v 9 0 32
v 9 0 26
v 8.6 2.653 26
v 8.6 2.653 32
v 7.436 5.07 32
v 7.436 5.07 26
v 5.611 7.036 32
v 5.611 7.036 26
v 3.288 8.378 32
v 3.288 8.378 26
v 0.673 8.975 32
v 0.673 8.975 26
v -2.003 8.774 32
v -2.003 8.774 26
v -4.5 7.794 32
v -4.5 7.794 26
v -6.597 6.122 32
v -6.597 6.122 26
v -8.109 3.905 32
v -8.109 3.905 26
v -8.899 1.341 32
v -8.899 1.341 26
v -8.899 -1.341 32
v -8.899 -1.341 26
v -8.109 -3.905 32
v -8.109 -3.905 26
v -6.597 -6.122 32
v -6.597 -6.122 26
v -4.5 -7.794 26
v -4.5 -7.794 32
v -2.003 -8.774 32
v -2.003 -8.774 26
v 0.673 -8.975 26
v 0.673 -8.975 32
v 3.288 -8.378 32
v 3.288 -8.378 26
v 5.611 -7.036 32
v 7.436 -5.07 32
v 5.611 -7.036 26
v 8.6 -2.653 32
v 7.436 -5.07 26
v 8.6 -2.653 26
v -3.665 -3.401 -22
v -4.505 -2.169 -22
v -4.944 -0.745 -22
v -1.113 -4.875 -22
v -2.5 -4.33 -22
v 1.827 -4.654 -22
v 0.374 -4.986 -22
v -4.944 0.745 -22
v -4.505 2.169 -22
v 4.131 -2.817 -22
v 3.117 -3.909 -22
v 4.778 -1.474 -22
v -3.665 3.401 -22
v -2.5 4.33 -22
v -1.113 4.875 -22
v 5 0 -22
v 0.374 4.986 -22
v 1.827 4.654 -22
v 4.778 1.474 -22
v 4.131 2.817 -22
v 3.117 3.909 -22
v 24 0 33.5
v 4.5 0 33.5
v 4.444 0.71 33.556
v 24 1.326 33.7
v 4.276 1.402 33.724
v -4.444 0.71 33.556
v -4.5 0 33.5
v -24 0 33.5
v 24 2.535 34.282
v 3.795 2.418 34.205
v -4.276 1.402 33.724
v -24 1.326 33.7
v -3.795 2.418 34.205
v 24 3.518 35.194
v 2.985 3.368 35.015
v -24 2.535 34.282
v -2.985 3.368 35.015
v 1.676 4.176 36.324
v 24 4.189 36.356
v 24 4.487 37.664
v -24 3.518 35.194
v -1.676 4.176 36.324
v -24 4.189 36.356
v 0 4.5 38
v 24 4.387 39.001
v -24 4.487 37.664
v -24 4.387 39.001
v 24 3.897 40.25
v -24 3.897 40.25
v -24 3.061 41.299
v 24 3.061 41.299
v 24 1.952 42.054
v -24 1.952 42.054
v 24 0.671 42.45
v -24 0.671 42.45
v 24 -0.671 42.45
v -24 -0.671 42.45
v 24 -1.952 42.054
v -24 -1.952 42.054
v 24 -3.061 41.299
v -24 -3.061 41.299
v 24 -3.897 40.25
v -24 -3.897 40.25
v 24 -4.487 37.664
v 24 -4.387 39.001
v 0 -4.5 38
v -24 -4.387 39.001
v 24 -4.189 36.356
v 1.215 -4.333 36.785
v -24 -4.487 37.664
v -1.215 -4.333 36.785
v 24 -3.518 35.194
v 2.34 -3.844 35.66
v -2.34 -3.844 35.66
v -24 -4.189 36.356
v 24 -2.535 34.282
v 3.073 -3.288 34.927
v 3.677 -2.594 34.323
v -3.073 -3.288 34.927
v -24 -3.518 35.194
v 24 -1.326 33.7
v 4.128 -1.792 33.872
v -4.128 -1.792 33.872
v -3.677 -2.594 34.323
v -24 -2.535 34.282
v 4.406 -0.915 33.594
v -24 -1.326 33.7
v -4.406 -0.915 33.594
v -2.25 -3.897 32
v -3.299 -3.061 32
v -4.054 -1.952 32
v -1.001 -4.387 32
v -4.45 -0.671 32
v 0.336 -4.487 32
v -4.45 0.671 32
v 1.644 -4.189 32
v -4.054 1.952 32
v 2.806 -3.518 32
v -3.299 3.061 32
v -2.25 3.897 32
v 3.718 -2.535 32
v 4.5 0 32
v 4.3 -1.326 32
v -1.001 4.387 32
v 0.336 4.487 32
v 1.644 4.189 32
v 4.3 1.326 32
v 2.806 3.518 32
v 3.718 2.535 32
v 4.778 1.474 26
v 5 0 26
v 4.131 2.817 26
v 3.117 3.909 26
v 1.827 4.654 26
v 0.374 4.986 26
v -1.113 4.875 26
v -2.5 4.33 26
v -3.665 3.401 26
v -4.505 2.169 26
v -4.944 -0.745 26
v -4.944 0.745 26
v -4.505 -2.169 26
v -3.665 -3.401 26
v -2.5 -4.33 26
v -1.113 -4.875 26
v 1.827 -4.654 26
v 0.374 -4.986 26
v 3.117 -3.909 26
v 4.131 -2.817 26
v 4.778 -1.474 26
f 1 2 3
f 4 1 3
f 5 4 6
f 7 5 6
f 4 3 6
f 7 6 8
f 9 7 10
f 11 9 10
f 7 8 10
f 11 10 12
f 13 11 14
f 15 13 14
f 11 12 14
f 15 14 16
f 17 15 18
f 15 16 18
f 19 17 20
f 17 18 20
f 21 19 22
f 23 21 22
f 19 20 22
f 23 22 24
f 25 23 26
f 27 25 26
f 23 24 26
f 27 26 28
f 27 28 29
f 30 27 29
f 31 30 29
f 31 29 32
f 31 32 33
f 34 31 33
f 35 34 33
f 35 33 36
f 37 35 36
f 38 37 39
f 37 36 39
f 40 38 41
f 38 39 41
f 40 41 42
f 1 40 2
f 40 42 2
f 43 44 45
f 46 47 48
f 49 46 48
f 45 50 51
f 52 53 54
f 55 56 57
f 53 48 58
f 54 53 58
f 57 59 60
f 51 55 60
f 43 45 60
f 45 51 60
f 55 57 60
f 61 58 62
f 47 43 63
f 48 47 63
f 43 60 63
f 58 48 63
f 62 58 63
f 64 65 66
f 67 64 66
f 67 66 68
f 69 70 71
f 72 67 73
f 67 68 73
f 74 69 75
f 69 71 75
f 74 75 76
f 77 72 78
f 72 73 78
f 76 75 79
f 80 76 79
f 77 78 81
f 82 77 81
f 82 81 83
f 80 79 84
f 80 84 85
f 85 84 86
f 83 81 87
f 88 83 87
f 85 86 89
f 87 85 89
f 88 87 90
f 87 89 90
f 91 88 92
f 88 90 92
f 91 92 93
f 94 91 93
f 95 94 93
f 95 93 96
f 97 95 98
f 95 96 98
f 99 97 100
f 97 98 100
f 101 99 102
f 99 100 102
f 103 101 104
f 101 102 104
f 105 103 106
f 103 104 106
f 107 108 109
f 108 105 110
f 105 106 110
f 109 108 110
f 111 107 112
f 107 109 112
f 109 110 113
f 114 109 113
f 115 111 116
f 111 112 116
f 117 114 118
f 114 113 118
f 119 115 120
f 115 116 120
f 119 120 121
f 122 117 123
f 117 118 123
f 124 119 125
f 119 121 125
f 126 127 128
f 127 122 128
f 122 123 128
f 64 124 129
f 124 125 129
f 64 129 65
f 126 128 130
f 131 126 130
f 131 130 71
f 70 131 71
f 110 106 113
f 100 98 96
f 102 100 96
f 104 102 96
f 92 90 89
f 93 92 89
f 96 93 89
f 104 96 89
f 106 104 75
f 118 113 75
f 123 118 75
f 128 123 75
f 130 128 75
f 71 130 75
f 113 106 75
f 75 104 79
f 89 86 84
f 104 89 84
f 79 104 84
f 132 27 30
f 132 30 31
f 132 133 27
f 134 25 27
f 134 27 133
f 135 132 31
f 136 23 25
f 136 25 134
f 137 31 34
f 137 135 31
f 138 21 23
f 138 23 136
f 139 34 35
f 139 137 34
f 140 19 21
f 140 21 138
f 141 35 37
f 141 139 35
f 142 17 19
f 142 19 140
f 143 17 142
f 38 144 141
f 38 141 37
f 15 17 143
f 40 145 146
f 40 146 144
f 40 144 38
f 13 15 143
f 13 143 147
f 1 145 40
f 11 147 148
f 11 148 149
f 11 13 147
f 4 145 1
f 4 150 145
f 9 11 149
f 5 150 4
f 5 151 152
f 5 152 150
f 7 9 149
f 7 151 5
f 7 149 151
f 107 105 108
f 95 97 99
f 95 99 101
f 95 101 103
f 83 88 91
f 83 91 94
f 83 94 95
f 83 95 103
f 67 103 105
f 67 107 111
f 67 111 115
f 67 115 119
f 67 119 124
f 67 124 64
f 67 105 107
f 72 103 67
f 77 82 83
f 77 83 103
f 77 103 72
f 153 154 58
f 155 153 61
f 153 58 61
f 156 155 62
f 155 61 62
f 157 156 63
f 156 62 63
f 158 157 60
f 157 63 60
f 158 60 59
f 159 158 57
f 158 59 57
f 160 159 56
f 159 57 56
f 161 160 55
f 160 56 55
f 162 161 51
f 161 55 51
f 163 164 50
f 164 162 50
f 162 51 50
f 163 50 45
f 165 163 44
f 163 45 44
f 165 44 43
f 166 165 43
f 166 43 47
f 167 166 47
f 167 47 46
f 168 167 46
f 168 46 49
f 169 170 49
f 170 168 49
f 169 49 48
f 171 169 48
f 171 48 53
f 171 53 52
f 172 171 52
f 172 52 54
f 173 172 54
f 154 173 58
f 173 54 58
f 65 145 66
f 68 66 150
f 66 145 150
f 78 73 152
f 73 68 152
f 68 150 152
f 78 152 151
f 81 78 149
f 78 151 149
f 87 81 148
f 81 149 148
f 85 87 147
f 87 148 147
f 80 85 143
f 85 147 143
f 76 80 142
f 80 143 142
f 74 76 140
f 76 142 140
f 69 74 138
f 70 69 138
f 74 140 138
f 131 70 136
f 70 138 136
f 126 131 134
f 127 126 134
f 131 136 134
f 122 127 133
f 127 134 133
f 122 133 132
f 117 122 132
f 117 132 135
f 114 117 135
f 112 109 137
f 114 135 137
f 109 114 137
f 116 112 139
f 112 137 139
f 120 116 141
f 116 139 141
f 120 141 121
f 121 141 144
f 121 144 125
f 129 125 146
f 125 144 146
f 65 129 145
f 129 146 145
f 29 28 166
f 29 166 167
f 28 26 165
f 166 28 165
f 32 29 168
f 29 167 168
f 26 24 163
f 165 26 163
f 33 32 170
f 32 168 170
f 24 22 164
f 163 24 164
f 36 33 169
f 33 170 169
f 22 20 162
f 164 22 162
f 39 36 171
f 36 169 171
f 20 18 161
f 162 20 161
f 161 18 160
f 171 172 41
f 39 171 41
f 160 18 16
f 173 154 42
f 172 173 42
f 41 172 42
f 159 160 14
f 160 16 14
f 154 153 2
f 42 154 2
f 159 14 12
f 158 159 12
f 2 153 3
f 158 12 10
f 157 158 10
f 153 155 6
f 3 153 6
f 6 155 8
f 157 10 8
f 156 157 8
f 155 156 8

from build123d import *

# Parameters (mm, degrees)
EXTRUDE_START       = -22
EXTRUDE_SKETCH_1_R  = 5
EXTRUDE_1_DEPTH     = 52
EXTRUDE_START_2     = 26
EXTRUDE_SKETCH_2_R  = 9
EXTRUDE_2_DEPTH     = 6
PIPE_SKETCH_1_R     = 4.5
PIPE_1_DEPTH        = 48
PIPE_ROTATE_1_ANGLE = 90
EXTRUDE_START_3     = 30
EXTRUDE_SKETCH_3_R  = 4.5
EXTRUDE_3_DEPTH     = 8


with BuildPart() as part:
    # Extrude sketch 1 → Extrude 1 (new body)
    with BuildSketch(Plane.XY.offset(EXTRUDE_START)):
        Circle(EXTRUDE_SKETCH_1_R)
    extrude(amount=EXTRUDE_1_DEPTH)


with BuildPart() as body_2:
    # Extrude sketch 2 → Extrude 2 (new body)
    with BuildSketch(Plane.XY.offset(EXTRUDE_START_2)):
        Circle(EXTRUDE_SKETCH_2_R)
    extrude(amount=EXTRUDE_2_DEPTH)


with BuildPart() as body_3:
    # Pipe sketch 1 → Pipe 1 (new body)
    with BuildSketch(Plane.XY):
        Circle(PIPE_SKETCH_1_R)
    extrude(amount=PIPE_1_DEPTH)


with BuildPart() as body_3_1:
    # Pipe rotate 1: moved
    add(body_3.part.rotate(Axis((0, 0, 0), (0, 1, 0)), PIPE_ROTATE_1_ANGLE))


with BuildPart() as body_3_2:
    # Pipe place 1: moved
    add(body_3_1.part.moved(Location((-24, 0, 38))))


with BuildPart() as body_4:
    # Extrude sketch 3 → Extrude 3 (new body)
    with BuildSketch(Plane.XY.offset(EXTRUDE_START_3)):
        Circle(EXTRUDE_SKETCH_3_R)
    extrude(amount=EXTRUDE_3_DEPTH)


with BuildPart() as body_3_3:
    add(body_3_2.part)

    # Combine (weld / assembly of features): union body 2, body 4, part
    add(body_2.part)
    add(body_4.part)
    add(part.part)


solid = body_3_3.part
